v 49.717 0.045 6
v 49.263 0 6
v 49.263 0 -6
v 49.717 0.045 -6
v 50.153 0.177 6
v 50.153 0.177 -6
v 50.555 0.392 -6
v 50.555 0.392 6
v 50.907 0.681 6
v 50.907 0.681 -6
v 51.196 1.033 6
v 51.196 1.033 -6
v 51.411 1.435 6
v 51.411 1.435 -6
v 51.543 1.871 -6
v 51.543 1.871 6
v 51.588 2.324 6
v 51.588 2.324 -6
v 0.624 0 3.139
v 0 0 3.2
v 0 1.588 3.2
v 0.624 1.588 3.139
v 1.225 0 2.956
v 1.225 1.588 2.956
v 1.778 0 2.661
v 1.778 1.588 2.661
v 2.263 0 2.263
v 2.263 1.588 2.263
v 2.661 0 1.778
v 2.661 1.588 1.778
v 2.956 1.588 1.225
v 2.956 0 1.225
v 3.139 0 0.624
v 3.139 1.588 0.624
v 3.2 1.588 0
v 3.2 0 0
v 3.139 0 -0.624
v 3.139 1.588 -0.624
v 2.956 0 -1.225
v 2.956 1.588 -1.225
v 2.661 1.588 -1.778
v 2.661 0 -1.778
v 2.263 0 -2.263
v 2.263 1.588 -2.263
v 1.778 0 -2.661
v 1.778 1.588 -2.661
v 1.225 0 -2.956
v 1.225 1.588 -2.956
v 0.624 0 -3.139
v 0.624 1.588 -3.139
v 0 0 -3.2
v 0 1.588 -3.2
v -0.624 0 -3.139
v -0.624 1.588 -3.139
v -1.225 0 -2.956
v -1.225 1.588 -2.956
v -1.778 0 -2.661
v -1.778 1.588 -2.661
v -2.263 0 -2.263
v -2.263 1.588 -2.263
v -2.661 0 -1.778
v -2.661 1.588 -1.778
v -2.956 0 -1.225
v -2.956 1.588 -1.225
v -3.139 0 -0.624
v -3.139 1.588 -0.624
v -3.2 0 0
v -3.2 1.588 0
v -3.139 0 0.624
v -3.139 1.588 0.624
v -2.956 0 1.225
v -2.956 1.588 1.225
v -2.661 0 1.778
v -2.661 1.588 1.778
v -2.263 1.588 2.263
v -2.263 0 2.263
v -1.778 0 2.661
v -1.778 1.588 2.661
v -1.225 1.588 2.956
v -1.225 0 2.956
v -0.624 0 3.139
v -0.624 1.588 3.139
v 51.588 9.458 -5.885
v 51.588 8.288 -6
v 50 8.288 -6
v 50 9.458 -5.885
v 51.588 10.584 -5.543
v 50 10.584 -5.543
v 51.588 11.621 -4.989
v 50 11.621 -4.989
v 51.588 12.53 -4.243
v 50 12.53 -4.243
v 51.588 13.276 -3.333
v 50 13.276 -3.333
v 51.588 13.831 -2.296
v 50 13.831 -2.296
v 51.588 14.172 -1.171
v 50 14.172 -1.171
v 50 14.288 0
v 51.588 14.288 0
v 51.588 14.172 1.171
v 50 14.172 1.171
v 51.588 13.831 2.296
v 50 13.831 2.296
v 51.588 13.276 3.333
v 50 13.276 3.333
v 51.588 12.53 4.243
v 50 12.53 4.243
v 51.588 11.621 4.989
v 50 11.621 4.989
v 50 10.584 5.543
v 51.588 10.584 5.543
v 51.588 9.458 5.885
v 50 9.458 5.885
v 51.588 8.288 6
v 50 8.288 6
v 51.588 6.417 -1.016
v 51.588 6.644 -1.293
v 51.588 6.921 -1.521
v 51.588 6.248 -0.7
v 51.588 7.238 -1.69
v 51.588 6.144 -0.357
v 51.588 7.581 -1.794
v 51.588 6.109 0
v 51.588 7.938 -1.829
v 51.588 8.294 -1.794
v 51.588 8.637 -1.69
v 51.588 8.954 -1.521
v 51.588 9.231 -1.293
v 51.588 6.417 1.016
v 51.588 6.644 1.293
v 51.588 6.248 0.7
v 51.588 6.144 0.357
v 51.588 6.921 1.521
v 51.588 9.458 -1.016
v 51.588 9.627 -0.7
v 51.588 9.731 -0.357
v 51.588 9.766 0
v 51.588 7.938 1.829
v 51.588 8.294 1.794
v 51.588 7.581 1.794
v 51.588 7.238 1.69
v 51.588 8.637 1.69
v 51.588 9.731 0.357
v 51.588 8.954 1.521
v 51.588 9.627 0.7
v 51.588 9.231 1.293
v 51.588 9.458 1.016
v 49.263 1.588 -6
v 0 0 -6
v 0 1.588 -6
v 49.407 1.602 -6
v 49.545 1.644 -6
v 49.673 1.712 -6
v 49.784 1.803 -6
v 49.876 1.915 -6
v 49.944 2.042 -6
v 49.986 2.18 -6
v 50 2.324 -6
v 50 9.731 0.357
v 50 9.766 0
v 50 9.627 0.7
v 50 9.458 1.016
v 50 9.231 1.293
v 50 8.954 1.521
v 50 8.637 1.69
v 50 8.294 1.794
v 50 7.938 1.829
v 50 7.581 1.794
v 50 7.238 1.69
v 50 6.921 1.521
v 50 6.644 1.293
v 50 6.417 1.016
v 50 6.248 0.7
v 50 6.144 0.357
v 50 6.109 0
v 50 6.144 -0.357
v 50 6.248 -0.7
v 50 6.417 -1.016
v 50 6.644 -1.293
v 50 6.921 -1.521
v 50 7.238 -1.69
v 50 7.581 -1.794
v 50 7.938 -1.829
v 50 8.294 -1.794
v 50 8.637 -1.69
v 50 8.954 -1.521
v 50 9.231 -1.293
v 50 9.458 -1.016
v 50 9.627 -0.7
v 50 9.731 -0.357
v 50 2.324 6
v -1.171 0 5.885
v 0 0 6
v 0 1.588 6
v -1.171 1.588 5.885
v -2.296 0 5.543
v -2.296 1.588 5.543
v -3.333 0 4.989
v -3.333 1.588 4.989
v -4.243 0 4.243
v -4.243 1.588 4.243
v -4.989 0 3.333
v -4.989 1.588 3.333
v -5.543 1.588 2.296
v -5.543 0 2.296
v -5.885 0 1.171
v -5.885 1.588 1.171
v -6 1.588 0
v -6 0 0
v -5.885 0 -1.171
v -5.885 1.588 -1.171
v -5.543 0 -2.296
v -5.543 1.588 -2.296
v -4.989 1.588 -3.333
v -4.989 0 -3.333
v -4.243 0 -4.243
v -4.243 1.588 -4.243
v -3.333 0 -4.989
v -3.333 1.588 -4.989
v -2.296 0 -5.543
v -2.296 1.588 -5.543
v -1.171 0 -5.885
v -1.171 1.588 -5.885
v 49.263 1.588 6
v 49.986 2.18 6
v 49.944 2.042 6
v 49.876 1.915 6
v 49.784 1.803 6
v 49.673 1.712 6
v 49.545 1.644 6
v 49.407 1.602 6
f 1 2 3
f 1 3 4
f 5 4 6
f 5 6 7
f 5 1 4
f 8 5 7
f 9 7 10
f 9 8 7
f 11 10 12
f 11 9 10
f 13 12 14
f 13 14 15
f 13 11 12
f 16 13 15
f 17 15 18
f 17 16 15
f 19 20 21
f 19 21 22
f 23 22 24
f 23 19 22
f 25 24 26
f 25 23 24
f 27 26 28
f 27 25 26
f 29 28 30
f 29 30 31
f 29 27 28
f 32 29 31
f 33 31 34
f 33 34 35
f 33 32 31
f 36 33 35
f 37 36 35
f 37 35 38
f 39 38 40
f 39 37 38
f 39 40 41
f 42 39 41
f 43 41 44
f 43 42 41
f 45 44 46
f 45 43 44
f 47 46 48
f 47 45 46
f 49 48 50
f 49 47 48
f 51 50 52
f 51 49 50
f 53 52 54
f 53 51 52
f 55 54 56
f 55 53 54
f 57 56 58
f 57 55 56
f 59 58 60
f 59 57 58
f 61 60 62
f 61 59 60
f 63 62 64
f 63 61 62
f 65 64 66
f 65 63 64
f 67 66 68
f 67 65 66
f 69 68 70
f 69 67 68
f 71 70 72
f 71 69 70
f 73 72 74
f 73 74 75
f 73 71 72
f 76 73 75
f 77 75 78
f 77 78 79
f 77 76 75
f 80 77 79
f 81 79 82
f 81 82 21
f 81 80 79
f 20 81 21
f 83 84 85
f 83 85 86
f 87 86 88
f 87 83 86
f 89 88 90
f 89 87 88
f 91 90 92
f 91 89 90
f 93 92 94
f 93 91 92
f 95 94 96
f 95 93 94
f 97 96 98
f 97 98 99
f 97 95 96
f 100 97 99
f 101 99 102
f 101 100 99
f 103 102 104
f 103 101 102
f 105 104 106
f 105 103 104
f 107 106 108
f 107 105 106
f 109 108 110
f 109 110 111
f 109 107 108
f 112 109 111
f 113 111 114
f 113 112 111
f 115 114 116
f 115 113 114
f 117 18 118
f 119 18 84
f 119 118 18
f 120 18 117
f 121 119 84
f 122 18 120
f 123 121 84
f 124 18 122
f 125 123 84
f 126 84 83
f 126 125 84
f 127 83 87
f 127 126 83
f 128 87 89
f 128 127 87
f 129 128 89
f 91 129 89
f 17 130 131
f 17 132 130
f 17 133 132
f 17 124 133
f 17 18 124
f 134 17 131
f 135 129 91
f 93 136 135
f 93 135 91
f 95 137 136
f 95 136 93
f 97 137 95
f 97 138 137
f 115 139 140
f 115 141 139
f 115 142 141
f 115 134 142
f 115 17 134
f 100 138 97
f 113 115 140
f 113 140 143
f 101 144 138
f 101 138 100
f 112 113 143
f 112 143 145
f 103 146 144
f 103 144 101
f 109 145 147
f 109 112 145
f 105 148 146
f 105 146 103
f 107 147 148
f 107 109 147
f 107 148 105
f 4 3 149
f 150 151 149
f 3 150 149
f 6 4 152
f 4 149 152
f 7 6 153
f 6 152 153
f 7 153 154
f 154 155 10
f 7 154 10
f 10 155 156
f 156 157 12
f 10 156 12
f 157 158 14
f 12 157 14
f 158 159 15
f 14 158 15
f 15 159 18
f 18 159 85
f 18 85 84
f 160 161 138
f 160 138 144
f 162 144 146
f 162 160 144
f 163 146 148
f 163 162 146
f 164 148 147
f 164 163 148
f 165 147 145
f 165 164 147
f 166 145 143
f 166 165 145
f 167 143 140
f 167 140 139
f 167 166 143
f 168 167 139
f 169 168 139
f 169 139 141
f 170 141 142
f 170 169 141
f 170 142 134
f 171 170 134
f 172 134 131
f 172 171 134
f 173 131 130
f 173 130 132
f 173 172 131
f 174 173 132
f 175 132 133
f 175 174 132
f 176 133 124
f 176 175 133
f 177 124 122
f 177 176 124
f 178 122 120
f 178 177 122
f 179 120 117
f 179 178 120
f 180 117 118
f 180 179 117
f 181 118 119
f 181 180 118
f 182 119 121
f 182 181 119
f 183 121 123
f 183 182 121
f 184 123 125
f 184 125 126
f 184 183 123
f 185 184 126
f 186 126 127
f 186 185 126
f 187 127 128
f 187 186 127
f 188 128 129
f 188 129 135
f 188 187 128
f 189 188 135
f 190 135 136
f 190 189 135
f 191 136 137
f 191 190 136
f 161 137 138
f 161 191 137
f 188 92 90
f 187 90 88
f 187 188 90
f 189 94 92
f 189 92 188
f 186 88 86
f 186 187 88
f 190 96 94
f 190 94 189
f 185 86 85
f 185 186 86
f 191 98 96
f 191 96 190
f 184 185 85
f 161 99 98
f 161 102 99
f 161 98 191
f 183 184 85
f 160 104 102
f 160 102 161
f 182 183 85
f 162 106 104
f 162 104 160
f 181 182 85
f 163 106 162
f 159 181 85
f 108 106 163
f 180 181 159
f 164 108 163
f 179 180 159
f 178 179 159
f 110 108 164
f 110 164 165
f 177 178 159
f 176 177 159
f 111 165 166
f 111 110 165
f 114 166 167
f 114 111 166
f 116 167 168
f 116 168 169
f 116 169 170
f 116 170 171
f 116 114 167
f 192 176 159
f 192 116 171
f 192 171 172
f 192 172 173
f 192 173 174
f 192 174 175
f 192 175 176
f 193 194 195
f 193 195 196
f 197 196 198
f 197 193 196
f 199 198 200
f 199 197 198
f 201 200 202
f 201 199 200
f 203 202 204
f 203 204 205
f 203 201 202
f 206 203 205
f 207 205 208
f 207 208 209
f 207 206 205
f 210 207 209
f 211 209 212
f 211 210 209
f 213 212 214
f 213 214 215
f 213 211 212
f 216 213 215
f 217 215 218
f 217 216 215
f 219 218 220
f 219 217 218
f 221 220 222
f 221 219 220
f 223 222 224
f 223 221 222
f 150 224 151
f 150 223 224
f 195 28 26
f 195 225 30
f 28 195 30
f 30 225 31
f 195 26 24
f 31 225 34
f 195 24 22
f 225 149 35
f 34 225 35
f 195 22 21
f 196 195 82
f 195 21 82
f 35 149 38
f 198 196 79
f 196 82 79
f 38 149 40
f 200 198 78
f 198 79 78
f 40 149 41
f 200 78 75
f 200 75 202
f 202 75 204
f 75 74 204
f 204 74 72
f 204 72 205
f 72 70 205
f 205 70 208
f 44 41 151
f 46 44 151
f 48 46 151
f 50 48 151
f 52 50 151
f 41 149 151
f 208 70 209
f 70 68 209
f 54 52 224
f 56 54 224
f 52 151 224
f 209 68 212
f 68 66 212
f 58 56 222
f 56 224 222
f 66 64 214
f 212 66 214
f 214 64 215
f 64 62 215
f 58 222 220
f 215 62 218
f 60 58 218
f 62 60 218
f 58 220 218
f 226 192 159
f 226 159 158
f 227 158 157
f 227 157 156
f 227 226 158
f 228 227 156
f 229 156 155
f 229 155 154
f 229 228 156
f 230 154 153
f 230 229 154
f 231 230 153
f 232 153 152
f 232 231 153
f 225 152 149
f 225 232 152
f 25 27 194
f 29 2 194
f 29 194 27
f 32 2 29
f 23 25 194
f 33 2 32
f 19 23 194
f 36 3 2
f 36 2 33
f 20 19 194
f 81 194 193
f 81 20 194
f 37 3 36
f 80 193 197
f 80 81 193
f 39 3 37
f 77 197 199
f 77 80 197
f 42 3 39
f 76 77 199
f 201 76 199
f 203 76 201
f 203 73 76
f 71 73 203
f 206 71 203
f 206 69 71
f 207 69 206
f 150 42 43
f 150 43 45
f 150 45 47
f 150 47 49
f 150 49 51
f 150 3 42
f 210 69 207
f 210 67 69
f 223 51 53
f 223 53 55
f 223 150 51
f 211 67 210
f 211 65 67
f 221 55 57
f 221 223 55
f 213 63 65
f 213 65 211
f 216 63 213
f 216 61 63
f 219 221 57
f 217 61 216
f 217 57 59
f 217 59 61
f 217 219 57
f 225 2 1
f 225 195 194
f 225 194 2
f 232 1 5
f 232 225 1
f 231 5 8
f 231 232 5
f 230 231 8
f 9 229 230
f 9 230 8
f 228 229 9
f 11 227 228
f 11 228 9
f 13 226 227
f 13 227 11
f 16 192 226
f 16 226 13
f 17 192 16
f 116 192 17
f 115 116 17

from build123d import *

# Parameters (mm, degrees)
SKETCH1_R                    = 3.2
BASE_FLANGE1_DEPTH           = 1.5875
EDGE_FLANGE1_STRIP_W         = 7.8232
EDGE_FLANGE1_STRIP_H         = 1.5875
EDGE_FLANGE1_STRIP_CUT_DEPTH = 12
EDGE_FLANGE1_DEPTH           = 12
HOLE1_START                  = 50
HOLE1_OUTLINE_R              = 1.8288
HOLE1_DEPTH                  = 1.5875
FILLET1_RADIUS               = 6
FILLET1_LENGTH               = 1.5875


# Read off the part's stored shape, not the designer's step: Hole1
# Sheet-metal steps are written as plain solids
with BuildPart() as part:
    # Sketch1 → Base-Flange1 (new body)
    with BuildSketch(Plane(origin=(0, 0, 0), x_dir=(1, 0, 0), z_dir=(0, 1, 0))):
        with BuildLine():
            Line((0, 6), (50, 6))
            Line((50, 6), (50, -6))
            Line((50, -6), (0, -6))
            ThreePointArc((0, -6), (-6, 0), (0, 6))
        make_face()
        with Locations(Location((0, 0, 0), (0, 0, 270))):
            Circle(SKETCH1_R, mode=Mode.SUBTRACT)
    extrude(amount=BASE_FLANGE1_DEPTH)

    # Edge-Flange1 strip (across the edge) → Edge-Flange1 strip cut (cut)
    with BuildSketch(Plane(origin=(50, 1.5875, 6), x_dir=(-1, 0, 0), z_dir=(0, 0, -1))):
        with Locations((-3.175, -0.79375)):
            Rectangle(EDGE_FLANGE1_STRIP_W, EDGE_FLANGE1_STRIP_H)
    extrude(amount=EDGE_FLANGE1_STRIP_CUT_DEPTH, mode=Mode.SUBTRACT)

    # Edge-Flange1 section (across the edge) → Edge-Flange1 (add)
    with BuildSketch(Plane(origin=(50, 1.5875, 6), x_dir=(-1, 0, 0), z_dir=(0, 0, -1))):
        with BuildLine():
            Line((-1.5875, 0.7366), (-1.5875, 12.7))
            Line((-1.5875, 12.7), (0, 12.7))
            Line((0, 12.7), (0, 0.7366))
            ThreePointArc((0, 0.7366), (0.215745145, 0.215745145), (0.7366, 0))
            Line((0.7366, 0), (0.7366, -1.5875))
            ThreePointArc((0.7366, -1.5875), (-0.90678687, -0.90678687), (-1.5875, 0.7366))
        make_face()
    extrude(amount=EDGE_FLANGE1_DEPTH)

    # Hole1 outline → Hole1 (cut)
    with BuildSketch(Plane.YZ.offset(HOLE1_START)):
        with Locations((7.9375, 0)):
            Circle(HOLE1_OUTLINE_R)
    extrude(amount=HOLE1_DEPTH, mode=Mode.SUBTRACT)

    # Fillet1: full round fillet: the end face becomes a half cylinder, R = half its width
    fillet1_face = Plane((50.79375, 14.2875, 0), x_dir=(1, 0, 0), z_dir=(0, 1, 0))  # on the end face: x along it, z out of the body
    fillet1_slab = fillet1_face.offset(-FILLET1_RADIUS / 2) * Box(FILLET1_LENGTH, 2 * FILLET1_RADIUS, FILLET1_RADIUS, mode=Mode.PRIVATE)  # the body's end, R deep
    fillet1_round = Plane((50.79375, 8.2875, 0), x_dir=(0, 1, 0), z_dir=(1, 0, 0)) * Cylinder(FILLET1_RADIUS, FILLET1_LENGTH, mode=Mode.PRIVATE)  # its axis R under the face
    add(fillet1_slab - fillet1_round, mode=Mode.SUBTRACT)


solid = part.part
